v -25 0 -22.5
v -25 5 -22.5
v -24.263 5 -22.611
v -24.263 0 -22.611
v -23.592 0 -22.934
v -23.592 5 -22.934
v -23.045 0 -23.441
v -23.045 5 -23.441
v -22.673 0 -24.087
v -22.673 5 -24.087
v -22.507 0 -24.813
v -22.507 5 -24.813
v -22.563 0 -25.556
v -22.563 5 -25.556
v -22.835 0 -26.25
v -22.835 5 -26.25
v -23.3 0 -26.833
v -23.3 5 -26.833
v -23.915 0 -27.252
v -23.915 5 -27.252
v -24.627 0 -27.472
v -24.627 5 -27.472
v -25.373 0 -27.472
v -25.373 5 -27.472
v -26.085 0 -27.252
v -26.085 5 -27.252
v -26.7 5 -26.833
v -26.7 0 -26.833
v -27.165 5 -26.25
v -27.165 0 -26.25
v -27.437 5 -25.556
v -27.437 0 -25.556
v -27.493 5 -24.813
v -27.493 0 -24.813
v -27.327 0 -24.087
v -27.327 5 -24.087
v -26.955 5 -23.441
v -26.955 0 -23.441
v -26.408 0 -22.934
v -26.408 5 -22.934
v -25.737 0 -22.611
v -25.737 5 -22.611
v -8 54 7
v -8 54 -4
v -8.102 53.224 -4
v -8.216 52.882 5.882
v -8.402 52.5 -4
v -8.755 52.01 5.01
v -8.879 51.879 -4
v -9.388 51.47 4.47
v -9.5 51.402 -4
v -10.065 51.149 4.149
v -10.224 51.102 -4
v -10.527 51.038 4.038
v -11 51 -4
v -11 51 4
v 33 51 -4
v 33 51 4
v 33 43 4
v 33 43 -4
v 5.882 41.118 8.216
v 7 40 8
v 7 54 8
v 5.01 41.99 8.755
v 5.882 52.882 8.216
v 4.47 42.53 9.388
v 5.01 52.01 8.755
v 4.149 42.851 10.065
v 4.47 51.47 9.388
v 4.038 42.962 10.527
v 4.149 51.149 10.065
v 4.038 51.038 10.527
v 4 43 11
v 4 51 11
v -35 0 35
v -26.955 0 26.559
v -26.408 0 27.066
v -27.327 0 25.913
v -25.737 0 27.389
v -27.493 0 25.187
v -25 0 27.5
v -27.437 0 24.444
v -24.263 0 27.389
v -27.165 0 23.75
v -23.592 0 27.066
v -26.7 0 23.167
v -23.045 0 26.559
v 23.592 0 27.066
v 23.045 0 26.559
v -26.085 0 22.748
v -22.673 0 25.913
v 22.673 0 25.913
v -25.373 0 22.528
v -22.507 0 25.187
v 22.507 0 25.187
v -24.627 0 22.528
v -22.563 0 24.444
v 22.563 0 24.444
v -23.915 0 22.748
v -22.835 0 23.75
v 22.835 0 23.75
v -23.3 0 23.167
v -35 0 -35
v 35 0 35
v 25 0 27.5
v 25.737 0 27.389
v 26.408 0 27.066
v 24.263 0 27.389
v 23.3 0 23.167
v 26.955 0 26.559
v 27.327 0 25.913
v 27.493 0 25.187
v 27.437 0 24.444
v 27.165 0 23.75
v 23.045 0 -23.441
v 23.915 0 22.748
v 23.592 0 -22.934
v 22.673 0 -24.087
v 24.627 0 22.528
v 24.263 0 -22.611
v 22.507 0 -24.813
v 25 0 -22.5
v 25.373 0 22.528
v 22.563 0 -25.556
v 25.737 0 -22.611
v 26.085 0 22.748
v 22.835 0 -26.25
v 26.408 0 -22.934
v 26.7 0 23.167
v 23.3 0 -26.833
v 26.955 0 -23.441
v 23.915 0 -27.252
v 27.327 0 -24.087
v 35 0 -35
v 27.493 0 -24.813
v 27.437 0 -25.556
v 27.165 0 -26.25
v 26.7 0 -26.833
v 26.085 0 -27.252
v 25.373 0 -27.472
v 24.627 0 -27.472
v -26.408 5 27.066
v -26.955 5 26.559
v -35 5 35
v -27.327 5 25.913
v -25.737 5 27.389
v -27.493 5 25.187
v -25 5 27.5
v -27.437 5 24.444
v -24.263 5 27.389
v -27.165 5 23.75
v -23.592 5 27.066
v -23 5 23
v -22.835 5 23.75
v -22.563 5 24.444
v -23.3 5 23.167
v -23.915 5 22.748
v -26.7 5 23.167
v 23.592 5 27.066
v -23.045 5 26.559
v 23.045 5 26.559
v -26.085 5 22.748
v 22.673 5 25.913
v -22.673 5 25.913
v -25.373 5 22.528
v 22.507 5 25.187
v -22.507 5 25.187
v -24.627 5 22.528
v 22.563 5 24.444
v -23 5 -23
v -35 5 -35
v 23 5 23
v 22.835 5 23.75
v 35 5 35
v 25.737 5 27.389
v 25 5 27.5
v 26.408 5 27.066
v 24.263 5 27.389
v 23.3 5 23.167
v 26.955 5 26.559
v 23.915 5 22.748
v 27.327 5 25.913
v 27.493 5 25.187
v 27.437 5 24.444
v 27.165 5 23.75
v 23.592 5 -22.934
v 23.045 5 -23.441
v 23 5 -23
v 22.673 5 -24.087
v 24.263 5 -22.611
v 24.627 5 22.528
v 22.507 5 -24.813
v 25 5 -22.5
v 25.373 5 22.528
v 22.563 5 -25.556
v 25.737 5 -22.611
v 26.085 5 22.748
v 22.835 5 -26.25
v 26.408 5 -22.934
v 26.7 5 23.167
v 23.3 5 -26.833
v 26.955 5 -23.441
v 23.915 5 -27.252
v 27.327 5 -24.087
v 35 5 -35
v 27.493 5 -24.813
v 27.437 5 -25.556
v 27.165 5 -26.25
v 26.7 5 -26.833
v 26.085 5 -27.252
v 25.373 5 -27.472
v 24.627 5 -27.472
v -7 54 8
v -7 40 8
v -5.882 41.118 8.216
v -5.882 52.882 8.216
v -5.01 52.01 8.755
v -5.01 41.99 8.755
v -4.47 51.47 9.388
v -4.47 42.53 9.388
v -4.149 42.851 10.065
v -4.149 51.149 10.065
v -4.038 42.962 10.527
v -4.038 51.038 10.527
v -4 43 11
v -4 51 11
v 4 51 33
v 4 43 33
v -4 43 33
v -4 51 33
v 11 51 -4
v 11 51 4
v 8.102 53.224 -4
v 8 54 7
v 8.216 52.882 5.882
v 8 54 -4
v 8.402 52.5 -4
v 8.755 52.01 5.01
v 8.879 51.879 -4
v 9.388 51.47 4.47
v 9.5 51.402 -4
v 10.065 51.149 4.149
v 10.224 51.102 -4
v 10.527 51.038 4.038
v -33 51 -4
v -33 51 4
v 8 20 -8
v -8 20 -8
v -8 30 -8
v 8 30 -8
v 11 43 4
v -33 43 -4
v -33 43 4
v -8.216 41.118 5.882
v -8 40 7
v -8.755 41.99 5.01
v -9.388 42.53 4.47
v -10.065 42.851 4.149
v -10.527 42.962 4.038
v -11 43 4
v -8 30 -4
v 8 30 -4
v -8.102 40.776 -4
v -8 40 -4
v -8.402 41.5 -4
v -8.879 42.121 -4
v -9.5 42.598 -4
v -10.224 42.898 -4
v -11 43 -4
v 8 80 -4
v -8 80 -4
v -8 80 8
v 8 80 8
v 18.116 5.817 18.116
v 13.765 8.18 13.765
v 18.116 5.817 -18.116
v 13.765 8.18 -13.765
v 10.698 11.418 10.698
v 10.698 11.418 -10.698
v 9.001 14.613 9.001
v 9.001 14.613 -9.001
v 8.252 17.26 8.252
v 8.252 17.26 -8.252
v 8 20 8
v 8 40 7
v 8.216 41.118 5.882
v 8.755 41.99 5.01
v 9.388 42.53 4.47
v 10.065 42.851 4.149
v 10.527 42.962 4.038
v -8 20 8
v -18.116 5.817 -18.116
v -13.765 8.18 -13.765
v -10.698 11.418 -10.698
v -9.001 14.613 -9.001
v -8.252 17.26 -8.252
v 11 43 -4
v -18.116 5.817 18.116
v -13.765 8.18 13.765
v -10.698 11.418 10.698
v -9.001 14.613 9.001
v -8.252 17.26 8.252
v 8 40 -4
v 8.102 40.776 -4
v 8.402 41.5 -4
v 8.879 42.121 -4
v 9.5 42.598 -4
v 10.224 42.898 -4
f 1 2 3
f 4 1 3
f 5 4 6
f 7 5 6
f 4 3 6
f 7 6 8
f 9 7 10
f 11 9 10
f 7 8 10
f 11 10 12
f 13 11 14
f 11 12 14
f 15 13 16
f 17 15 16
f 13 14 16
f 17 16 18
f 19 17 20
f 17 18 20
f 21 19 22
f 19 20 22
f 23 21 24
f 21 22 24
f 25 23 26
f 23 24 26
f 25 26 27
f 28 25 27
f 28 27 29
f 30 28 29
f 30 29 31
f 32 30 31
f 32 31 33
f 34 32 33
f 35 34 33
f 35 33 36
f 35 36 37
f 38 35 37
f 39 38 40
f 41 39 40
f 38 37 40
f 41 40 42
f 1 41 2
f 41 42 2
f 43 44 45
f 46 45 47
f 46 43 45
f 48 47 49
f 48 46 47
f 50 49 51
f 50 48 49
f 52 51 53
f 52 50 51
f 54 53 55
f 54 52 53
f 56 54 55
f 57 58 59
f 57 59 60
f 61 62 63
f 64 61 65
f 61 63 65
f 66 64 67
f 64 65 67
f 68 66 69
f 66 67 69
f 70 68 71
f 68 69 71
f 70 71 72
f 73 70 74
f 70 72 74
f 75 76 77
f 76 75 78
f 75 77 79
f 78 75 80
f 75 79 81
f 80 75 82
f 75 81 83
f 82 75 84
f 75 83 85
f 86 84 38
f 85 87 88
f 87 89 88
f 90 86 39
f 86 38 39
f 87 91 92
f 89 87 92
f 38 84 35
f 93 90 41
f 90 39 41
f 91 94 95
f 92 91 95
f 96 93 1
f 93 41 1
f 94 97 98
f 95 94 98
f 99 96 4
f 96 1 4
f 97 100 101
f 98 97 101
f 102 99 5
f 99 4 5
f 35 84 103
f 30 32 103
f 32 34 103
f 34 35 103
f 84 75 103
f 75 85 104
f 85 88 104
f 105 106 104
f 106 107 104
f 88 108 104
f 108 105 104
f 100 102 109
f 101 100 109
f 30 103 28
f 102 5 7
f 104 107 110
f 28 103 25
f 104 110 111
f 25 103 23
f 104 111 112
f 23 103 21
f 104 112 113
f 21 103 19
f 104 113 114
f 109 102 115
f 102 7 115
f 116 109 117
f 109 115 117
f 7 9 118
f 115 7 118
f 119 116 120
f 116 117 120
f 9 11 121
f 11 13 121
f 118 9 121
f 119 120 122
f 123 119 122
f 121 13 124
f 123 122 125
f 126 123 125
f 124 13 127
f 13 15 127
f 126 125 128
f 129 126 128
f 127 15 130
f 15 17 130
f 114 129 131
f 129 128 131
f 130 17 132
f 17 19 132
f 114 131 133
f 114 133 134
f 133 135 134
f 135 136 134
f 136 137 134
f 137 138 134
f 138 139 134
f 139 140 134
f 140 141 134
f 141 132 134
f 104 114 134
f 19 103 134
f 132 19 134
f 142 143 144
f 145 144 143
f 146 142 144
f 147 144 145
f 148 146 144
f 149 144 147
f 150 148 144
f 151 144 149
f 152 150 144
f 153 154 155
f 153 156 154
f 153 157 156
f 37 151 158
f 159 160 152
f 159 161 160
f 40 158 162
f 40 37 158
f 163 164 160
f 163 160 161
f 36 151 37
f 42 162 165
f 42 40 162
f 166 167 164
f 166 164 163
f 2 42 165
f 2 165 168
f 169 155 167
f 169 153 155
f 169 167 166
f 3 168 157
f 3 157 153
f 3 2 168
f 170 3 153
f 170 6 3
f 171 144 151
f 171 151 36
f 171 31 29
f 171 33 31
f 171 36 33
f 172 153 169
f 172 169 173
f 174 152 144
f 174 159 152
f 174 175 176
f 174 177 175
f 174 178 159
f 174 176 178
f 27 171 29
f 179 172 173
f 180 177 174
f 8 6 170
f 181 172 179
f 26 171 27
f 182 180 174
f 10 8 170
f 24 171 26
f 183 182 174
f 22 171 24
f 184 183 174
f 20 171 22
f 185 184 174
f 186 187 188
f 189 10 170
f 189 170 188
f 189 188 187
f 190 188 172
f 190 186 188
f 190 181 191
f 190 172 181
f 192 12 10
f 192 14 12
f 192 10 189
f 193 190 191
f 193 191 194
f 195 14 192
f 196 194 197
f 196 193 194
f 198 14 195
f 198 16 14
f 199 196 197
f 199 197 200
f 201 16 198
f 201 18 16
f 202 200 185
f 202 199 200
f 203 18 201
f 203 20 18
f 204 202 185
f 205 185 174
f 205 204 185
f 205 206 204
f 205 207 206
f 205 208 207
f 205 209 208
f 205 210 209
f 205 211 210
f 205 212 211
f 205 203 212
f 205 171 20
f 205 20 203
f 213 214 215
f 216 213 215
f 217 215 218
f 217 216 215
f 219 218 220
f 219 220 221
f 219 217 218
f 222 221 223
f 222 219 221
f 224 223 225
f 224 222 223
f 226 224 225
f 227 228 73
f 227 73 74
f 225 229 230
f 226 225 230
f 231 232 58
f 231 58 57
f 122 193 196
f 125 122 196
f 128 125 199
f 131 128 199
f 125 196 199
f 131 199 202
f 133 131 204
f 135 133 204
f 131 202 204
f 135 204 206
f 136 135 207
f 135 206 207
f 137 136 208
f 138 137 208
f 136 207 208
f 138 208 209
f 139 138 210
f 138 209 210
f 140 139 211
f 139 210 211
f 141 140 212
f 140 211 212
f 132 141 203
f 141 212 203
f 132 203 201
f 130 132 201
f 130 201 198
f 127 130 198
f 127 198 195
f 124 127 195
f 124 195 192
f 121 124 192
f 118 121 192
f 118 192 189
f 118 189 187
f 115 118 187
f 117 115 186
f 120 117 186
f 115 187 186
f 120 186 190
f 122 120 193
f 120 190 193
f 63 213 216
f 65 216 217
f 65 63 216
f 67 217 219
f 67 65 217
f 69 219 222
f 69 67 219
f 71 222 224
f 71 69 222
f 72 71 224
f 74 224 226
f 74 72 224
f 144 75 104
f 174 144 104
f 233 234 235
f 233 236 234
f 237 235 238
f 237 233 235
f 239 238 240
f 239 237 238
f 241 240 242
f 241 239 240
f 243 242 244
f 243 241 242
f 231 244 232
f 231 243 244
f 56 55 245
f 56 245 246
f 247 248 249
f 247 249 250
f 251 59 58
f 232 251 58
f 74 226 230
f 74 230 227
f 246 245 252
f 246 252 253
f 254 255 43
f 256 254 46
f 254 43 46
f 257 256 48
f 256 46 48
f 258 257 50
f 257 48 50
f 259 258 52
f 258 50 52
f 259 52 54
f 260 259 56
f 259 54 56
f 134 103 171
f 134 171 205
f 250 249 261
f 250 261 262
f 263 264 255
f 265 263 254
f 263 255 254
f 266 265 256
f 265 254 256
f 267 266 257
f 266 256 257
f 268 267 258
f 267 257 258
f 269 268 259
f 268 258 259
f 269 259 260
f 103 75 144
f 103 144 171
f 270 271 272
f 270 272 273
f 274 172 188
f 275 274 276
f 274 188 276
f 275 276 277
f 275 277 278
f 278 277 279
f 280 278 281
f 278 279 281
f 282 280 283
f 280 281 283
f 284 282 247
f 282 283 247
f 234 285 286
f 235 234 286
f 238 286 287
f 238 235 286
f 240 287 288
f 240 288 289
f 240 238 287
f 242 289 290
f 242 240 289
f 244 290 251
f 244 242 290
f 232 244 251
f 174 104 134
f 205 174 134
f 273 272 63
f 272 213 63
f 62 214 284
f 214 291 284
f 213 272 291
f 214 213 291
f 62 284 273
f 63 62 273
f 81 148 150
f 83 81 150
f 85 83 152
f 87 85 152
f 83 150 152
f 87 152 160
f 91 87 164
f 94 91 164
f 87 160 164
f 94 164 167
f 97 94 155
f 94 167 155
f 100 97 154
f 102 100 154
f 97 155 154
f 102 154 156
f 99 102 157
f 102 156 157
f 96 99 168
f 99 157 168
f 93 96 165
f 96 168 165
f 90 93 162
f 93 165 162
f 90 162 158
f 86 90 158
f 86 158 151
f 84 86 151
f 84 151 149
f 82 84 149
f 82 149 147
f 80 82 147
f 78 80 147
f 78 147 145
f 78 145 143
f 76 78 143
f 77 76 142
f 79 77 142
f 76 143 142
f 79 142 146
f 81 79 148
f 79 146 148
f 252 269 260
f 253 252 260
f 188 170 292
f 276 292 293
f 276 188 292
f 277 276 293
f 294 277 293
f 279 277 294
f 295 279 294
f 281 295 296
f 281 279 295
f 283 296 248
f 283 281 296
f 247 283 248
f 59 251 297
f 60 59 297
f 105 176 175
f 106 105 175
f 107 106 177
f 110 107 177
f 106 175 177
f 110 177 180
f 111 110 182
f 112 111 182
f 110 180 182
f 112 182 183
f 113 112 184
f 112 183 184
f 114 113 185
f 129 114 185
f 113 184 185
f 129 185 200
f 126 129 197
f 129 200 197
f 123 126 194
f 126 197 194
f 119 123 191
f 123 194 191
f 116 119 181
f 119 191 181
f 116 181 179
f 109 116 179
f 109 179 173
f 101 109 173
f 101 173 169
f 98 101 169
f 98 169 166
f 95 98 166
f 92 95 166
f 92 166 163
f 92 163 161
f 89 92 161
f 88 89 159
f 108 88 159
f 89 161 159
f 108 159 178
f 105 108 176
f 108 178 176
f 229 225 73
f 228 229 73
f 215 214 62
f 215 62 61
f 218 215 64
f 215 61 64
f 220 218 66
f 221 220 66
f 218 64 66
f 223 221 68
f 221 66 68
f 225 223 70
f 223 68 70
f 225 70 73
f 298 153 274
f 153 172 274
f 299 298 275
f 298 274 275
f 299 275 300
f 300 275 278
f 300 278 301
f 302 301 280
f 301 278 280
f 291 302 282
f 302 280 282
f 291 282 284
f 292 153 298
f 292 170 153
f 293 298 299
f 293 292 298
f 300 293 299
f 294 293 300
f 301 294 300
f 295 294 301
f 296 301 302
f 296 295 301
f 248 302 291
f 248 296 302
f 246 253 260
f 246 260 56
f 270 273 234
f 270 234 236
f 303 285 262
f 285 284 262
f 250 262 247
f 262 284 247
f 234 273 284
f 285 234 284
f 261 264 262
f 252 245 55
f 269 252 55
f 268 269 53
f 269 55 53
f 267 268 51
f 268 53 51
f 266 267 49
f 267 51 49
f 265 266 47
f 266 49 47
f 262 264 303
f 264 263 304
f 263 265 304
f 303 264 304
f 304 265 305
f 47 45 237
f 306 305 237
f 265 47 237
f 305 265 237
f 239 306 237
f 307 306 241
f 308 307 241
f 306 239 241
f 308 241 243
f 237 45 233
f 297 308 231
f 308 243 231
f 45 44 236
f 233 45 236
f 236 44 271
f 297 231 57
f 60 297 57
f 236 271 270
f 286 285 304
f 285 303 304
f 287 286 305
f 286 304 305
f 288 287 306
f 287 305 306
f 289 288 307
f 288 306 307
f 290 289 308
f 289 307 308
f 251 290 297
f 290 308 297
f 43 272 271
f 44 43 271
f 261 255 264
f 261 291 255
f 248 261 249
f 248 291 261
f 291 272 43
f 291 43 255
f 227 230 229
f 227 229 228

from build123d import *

# Parameters (mm, degrees)
SKETCH1_W           = 70
SKETCH1_H           = 70
BOSS_EXTRUDE1_DEPTH = 5
SKETCH2_R           = 2.5
CUT_EXTRUDE1_DEPTH  = 5
SKETCH3_R           = 2.5
CUT_EXTRUDE2_DEPTH  = 5
SKETCH4_R           = 2.5
CUT_EXTRUDE3_DEPTH  = 5
SKETCH5_R           = 2.5
CUT_EXTRUDE4_DEPTH  = 5
SKETCH7_W           = 16
SKETCH7_H           = 16
BOSS_EXTRUDE2_DEPTH = 75
SKETCH8_W           = 8
SKETCH8_H           = 8
BOSS_EXTRUDE3_DEPTH = 25
SKETCH9_W           = 8
SKETCH9_H           = 8
BOSS_EXTRUDE4_DEPTH = 25
SKETCH10_W          = 8
SKETCH10_H          = 8
BOSS_EXTRUDE5_DEPTH = 25
SKETCH11_W          = 16
SKETCH11_H          = 4
CUT_EXTRUDE5_DEPTH  = 50
FILLET1_R           = 15
FILLET2_R           = 3


with BuildPart() as part:
    # Sketch1 → Boss-Extrude1 (new body)
    with BuildSketch(Plane(origin=(0, 0, 0), x_dir=(1, 0, 0), z_dir=(0, 1, 0))):
        Rectangle(SKETCH1_W, SKETCH1_H)
    extrude(amount=BOSS_EXTRUDE1_DEPTH)

    # Sketch2 → Cut-Extrude1 (cut)
    with BuildSketch(Plane(origin=(0, 5, 0), x_dir=(1, 0, 0), z_dir=(0, 1, 0))):
        with Locations(Location((-25, 25, 0), (0, 0, 270))):
            Circle(SKETCH2_R)
    extrude(amount=-CUT_EXTRUDE1_DEPTH, mode=Mode.SUBTRACT)

    # Sketch3 → Cut-Extrude2 (cut)
    with BuildSketch(Plane(origin=(0, 5, 0), x_dir=(1, 0, 0), z_dir=(0, 1, 0))):
        with Locations(Location((25, 25, 0), (0, 0, 270))):
            Circle(SKETCH3_R)
    extrude(amount=-CUT_EXTRUDE2_DEPTH, mode=Mode.SUBTRACT)

    # Sketch4 → Cut-Extrude3 (cut)
    with BuildSketch(Plane(origin=(0, 5, 0), x_dir=(1, 0, 0), z_dir=(0, 1, 0))):
        with Locations(Location((-25, -25, 0), (0, 0, 270))):
            Circle(SKETCH4_R)
    extrude(amount=-CUT_EXTRUDE3_DEPTH, mode=Mode.SUBTRACT)

    # Sketch5 → Cut-Extrude4 (cut)
    with BuildSketch(Plane(origin=(0, 5, 0), x_dir=(1, 0, 0), z_dir=(0, 1, 0))):
        with Locations(Location((25, -25, 0), (0, 0, 270))):
            Circle(SKETCH5_R)
    extrude(amount=-CUT_EXTRUDE4_DEPTH, mode=Mode.SUBTRACT)

    # Sketch7 → Boss-Extrude2 (add)
    with BuildSketch(Plane(origin=(0, 5, 0), x_dir=(1, 0, 0), z_dir=(0, 1, 0))):
        Rectangle(SKETCH7_W, SKETCH7_H)
    extrude(amount=BOSS_EXTRUDE2_DEPTH)

    # Sketch8 → Boss-Extrude3 (add)
    with BuildSketch(Plane.XY.offset(8)):
        with Locations((0, 47)):
            Rectangle(SKETCH8_W, SKETCH8_H)
    extrude(amount=BOSS_EXTRUDE3_DEPTH)

    # Sketch9 → Boss-Extrude4 (add)
    with BuildSketch(Plane(origin=(8, 0, 0), x_dir=(0, 0, -1), z_dir=(1, 0, 0))):
        with Locations((0, 47)):
            Rectangle(SKETCH9_W, SKETCH9_H)
    extrude(amount=BOSS_EXTRUDE4_DEPTH)

    # Sketch10 → Boss-Extrude5 (add)
    with BuildSketch(Plane.ZY.offset(8)):
        with Locations((0, 47)):
            Rectangle(SKETCH10_W, SKETCH10_H)
    extrude(amount=BOSS_EXTRUDE5_DEPTH)

    # Sketch11 → Cut-Extrude5 (cut)
    with BuildSketch(Plane(origin=(0, 80, 0), x_dir=(1, 0, 0), z_dir=(0, 1, 0))):
        with Locations((0, 6)):
            Rectangle(SKETCH11_W, SKETCH11_H)
    extrude(amount=-CUT_EXTRUDE5_DEPTH, mode=Mode.SUBTRACT)

    # Fillet1
    fillet1_edges = [part.edges().sort_by_distance(p)[0] for p in [
        (8, 5, 0),
        (0, 5, -8),
        (-8, 5, 0),
        (0, 5, 8),
    ]]
    fillet(fillet1_edges, radius=FILLET1_R)

    # Fillet2
    fillet2_edges = [part.edges().sort_by_distance(p)[0] for p in [
        (4, 47, 8),
        (0, 51, 8),
        (-4, 47, 8),
        (0, 43, 8),
        (8, 51, 0),
        (8, 47, 4),
        (8, 43, 0),
        (-8, 47, 4),
        (-8, 51, 0),
        (-8, 43, 0),
    ]]
    fillet(fillet2_edges, radius=FILLET2_R)


solid = part.part
